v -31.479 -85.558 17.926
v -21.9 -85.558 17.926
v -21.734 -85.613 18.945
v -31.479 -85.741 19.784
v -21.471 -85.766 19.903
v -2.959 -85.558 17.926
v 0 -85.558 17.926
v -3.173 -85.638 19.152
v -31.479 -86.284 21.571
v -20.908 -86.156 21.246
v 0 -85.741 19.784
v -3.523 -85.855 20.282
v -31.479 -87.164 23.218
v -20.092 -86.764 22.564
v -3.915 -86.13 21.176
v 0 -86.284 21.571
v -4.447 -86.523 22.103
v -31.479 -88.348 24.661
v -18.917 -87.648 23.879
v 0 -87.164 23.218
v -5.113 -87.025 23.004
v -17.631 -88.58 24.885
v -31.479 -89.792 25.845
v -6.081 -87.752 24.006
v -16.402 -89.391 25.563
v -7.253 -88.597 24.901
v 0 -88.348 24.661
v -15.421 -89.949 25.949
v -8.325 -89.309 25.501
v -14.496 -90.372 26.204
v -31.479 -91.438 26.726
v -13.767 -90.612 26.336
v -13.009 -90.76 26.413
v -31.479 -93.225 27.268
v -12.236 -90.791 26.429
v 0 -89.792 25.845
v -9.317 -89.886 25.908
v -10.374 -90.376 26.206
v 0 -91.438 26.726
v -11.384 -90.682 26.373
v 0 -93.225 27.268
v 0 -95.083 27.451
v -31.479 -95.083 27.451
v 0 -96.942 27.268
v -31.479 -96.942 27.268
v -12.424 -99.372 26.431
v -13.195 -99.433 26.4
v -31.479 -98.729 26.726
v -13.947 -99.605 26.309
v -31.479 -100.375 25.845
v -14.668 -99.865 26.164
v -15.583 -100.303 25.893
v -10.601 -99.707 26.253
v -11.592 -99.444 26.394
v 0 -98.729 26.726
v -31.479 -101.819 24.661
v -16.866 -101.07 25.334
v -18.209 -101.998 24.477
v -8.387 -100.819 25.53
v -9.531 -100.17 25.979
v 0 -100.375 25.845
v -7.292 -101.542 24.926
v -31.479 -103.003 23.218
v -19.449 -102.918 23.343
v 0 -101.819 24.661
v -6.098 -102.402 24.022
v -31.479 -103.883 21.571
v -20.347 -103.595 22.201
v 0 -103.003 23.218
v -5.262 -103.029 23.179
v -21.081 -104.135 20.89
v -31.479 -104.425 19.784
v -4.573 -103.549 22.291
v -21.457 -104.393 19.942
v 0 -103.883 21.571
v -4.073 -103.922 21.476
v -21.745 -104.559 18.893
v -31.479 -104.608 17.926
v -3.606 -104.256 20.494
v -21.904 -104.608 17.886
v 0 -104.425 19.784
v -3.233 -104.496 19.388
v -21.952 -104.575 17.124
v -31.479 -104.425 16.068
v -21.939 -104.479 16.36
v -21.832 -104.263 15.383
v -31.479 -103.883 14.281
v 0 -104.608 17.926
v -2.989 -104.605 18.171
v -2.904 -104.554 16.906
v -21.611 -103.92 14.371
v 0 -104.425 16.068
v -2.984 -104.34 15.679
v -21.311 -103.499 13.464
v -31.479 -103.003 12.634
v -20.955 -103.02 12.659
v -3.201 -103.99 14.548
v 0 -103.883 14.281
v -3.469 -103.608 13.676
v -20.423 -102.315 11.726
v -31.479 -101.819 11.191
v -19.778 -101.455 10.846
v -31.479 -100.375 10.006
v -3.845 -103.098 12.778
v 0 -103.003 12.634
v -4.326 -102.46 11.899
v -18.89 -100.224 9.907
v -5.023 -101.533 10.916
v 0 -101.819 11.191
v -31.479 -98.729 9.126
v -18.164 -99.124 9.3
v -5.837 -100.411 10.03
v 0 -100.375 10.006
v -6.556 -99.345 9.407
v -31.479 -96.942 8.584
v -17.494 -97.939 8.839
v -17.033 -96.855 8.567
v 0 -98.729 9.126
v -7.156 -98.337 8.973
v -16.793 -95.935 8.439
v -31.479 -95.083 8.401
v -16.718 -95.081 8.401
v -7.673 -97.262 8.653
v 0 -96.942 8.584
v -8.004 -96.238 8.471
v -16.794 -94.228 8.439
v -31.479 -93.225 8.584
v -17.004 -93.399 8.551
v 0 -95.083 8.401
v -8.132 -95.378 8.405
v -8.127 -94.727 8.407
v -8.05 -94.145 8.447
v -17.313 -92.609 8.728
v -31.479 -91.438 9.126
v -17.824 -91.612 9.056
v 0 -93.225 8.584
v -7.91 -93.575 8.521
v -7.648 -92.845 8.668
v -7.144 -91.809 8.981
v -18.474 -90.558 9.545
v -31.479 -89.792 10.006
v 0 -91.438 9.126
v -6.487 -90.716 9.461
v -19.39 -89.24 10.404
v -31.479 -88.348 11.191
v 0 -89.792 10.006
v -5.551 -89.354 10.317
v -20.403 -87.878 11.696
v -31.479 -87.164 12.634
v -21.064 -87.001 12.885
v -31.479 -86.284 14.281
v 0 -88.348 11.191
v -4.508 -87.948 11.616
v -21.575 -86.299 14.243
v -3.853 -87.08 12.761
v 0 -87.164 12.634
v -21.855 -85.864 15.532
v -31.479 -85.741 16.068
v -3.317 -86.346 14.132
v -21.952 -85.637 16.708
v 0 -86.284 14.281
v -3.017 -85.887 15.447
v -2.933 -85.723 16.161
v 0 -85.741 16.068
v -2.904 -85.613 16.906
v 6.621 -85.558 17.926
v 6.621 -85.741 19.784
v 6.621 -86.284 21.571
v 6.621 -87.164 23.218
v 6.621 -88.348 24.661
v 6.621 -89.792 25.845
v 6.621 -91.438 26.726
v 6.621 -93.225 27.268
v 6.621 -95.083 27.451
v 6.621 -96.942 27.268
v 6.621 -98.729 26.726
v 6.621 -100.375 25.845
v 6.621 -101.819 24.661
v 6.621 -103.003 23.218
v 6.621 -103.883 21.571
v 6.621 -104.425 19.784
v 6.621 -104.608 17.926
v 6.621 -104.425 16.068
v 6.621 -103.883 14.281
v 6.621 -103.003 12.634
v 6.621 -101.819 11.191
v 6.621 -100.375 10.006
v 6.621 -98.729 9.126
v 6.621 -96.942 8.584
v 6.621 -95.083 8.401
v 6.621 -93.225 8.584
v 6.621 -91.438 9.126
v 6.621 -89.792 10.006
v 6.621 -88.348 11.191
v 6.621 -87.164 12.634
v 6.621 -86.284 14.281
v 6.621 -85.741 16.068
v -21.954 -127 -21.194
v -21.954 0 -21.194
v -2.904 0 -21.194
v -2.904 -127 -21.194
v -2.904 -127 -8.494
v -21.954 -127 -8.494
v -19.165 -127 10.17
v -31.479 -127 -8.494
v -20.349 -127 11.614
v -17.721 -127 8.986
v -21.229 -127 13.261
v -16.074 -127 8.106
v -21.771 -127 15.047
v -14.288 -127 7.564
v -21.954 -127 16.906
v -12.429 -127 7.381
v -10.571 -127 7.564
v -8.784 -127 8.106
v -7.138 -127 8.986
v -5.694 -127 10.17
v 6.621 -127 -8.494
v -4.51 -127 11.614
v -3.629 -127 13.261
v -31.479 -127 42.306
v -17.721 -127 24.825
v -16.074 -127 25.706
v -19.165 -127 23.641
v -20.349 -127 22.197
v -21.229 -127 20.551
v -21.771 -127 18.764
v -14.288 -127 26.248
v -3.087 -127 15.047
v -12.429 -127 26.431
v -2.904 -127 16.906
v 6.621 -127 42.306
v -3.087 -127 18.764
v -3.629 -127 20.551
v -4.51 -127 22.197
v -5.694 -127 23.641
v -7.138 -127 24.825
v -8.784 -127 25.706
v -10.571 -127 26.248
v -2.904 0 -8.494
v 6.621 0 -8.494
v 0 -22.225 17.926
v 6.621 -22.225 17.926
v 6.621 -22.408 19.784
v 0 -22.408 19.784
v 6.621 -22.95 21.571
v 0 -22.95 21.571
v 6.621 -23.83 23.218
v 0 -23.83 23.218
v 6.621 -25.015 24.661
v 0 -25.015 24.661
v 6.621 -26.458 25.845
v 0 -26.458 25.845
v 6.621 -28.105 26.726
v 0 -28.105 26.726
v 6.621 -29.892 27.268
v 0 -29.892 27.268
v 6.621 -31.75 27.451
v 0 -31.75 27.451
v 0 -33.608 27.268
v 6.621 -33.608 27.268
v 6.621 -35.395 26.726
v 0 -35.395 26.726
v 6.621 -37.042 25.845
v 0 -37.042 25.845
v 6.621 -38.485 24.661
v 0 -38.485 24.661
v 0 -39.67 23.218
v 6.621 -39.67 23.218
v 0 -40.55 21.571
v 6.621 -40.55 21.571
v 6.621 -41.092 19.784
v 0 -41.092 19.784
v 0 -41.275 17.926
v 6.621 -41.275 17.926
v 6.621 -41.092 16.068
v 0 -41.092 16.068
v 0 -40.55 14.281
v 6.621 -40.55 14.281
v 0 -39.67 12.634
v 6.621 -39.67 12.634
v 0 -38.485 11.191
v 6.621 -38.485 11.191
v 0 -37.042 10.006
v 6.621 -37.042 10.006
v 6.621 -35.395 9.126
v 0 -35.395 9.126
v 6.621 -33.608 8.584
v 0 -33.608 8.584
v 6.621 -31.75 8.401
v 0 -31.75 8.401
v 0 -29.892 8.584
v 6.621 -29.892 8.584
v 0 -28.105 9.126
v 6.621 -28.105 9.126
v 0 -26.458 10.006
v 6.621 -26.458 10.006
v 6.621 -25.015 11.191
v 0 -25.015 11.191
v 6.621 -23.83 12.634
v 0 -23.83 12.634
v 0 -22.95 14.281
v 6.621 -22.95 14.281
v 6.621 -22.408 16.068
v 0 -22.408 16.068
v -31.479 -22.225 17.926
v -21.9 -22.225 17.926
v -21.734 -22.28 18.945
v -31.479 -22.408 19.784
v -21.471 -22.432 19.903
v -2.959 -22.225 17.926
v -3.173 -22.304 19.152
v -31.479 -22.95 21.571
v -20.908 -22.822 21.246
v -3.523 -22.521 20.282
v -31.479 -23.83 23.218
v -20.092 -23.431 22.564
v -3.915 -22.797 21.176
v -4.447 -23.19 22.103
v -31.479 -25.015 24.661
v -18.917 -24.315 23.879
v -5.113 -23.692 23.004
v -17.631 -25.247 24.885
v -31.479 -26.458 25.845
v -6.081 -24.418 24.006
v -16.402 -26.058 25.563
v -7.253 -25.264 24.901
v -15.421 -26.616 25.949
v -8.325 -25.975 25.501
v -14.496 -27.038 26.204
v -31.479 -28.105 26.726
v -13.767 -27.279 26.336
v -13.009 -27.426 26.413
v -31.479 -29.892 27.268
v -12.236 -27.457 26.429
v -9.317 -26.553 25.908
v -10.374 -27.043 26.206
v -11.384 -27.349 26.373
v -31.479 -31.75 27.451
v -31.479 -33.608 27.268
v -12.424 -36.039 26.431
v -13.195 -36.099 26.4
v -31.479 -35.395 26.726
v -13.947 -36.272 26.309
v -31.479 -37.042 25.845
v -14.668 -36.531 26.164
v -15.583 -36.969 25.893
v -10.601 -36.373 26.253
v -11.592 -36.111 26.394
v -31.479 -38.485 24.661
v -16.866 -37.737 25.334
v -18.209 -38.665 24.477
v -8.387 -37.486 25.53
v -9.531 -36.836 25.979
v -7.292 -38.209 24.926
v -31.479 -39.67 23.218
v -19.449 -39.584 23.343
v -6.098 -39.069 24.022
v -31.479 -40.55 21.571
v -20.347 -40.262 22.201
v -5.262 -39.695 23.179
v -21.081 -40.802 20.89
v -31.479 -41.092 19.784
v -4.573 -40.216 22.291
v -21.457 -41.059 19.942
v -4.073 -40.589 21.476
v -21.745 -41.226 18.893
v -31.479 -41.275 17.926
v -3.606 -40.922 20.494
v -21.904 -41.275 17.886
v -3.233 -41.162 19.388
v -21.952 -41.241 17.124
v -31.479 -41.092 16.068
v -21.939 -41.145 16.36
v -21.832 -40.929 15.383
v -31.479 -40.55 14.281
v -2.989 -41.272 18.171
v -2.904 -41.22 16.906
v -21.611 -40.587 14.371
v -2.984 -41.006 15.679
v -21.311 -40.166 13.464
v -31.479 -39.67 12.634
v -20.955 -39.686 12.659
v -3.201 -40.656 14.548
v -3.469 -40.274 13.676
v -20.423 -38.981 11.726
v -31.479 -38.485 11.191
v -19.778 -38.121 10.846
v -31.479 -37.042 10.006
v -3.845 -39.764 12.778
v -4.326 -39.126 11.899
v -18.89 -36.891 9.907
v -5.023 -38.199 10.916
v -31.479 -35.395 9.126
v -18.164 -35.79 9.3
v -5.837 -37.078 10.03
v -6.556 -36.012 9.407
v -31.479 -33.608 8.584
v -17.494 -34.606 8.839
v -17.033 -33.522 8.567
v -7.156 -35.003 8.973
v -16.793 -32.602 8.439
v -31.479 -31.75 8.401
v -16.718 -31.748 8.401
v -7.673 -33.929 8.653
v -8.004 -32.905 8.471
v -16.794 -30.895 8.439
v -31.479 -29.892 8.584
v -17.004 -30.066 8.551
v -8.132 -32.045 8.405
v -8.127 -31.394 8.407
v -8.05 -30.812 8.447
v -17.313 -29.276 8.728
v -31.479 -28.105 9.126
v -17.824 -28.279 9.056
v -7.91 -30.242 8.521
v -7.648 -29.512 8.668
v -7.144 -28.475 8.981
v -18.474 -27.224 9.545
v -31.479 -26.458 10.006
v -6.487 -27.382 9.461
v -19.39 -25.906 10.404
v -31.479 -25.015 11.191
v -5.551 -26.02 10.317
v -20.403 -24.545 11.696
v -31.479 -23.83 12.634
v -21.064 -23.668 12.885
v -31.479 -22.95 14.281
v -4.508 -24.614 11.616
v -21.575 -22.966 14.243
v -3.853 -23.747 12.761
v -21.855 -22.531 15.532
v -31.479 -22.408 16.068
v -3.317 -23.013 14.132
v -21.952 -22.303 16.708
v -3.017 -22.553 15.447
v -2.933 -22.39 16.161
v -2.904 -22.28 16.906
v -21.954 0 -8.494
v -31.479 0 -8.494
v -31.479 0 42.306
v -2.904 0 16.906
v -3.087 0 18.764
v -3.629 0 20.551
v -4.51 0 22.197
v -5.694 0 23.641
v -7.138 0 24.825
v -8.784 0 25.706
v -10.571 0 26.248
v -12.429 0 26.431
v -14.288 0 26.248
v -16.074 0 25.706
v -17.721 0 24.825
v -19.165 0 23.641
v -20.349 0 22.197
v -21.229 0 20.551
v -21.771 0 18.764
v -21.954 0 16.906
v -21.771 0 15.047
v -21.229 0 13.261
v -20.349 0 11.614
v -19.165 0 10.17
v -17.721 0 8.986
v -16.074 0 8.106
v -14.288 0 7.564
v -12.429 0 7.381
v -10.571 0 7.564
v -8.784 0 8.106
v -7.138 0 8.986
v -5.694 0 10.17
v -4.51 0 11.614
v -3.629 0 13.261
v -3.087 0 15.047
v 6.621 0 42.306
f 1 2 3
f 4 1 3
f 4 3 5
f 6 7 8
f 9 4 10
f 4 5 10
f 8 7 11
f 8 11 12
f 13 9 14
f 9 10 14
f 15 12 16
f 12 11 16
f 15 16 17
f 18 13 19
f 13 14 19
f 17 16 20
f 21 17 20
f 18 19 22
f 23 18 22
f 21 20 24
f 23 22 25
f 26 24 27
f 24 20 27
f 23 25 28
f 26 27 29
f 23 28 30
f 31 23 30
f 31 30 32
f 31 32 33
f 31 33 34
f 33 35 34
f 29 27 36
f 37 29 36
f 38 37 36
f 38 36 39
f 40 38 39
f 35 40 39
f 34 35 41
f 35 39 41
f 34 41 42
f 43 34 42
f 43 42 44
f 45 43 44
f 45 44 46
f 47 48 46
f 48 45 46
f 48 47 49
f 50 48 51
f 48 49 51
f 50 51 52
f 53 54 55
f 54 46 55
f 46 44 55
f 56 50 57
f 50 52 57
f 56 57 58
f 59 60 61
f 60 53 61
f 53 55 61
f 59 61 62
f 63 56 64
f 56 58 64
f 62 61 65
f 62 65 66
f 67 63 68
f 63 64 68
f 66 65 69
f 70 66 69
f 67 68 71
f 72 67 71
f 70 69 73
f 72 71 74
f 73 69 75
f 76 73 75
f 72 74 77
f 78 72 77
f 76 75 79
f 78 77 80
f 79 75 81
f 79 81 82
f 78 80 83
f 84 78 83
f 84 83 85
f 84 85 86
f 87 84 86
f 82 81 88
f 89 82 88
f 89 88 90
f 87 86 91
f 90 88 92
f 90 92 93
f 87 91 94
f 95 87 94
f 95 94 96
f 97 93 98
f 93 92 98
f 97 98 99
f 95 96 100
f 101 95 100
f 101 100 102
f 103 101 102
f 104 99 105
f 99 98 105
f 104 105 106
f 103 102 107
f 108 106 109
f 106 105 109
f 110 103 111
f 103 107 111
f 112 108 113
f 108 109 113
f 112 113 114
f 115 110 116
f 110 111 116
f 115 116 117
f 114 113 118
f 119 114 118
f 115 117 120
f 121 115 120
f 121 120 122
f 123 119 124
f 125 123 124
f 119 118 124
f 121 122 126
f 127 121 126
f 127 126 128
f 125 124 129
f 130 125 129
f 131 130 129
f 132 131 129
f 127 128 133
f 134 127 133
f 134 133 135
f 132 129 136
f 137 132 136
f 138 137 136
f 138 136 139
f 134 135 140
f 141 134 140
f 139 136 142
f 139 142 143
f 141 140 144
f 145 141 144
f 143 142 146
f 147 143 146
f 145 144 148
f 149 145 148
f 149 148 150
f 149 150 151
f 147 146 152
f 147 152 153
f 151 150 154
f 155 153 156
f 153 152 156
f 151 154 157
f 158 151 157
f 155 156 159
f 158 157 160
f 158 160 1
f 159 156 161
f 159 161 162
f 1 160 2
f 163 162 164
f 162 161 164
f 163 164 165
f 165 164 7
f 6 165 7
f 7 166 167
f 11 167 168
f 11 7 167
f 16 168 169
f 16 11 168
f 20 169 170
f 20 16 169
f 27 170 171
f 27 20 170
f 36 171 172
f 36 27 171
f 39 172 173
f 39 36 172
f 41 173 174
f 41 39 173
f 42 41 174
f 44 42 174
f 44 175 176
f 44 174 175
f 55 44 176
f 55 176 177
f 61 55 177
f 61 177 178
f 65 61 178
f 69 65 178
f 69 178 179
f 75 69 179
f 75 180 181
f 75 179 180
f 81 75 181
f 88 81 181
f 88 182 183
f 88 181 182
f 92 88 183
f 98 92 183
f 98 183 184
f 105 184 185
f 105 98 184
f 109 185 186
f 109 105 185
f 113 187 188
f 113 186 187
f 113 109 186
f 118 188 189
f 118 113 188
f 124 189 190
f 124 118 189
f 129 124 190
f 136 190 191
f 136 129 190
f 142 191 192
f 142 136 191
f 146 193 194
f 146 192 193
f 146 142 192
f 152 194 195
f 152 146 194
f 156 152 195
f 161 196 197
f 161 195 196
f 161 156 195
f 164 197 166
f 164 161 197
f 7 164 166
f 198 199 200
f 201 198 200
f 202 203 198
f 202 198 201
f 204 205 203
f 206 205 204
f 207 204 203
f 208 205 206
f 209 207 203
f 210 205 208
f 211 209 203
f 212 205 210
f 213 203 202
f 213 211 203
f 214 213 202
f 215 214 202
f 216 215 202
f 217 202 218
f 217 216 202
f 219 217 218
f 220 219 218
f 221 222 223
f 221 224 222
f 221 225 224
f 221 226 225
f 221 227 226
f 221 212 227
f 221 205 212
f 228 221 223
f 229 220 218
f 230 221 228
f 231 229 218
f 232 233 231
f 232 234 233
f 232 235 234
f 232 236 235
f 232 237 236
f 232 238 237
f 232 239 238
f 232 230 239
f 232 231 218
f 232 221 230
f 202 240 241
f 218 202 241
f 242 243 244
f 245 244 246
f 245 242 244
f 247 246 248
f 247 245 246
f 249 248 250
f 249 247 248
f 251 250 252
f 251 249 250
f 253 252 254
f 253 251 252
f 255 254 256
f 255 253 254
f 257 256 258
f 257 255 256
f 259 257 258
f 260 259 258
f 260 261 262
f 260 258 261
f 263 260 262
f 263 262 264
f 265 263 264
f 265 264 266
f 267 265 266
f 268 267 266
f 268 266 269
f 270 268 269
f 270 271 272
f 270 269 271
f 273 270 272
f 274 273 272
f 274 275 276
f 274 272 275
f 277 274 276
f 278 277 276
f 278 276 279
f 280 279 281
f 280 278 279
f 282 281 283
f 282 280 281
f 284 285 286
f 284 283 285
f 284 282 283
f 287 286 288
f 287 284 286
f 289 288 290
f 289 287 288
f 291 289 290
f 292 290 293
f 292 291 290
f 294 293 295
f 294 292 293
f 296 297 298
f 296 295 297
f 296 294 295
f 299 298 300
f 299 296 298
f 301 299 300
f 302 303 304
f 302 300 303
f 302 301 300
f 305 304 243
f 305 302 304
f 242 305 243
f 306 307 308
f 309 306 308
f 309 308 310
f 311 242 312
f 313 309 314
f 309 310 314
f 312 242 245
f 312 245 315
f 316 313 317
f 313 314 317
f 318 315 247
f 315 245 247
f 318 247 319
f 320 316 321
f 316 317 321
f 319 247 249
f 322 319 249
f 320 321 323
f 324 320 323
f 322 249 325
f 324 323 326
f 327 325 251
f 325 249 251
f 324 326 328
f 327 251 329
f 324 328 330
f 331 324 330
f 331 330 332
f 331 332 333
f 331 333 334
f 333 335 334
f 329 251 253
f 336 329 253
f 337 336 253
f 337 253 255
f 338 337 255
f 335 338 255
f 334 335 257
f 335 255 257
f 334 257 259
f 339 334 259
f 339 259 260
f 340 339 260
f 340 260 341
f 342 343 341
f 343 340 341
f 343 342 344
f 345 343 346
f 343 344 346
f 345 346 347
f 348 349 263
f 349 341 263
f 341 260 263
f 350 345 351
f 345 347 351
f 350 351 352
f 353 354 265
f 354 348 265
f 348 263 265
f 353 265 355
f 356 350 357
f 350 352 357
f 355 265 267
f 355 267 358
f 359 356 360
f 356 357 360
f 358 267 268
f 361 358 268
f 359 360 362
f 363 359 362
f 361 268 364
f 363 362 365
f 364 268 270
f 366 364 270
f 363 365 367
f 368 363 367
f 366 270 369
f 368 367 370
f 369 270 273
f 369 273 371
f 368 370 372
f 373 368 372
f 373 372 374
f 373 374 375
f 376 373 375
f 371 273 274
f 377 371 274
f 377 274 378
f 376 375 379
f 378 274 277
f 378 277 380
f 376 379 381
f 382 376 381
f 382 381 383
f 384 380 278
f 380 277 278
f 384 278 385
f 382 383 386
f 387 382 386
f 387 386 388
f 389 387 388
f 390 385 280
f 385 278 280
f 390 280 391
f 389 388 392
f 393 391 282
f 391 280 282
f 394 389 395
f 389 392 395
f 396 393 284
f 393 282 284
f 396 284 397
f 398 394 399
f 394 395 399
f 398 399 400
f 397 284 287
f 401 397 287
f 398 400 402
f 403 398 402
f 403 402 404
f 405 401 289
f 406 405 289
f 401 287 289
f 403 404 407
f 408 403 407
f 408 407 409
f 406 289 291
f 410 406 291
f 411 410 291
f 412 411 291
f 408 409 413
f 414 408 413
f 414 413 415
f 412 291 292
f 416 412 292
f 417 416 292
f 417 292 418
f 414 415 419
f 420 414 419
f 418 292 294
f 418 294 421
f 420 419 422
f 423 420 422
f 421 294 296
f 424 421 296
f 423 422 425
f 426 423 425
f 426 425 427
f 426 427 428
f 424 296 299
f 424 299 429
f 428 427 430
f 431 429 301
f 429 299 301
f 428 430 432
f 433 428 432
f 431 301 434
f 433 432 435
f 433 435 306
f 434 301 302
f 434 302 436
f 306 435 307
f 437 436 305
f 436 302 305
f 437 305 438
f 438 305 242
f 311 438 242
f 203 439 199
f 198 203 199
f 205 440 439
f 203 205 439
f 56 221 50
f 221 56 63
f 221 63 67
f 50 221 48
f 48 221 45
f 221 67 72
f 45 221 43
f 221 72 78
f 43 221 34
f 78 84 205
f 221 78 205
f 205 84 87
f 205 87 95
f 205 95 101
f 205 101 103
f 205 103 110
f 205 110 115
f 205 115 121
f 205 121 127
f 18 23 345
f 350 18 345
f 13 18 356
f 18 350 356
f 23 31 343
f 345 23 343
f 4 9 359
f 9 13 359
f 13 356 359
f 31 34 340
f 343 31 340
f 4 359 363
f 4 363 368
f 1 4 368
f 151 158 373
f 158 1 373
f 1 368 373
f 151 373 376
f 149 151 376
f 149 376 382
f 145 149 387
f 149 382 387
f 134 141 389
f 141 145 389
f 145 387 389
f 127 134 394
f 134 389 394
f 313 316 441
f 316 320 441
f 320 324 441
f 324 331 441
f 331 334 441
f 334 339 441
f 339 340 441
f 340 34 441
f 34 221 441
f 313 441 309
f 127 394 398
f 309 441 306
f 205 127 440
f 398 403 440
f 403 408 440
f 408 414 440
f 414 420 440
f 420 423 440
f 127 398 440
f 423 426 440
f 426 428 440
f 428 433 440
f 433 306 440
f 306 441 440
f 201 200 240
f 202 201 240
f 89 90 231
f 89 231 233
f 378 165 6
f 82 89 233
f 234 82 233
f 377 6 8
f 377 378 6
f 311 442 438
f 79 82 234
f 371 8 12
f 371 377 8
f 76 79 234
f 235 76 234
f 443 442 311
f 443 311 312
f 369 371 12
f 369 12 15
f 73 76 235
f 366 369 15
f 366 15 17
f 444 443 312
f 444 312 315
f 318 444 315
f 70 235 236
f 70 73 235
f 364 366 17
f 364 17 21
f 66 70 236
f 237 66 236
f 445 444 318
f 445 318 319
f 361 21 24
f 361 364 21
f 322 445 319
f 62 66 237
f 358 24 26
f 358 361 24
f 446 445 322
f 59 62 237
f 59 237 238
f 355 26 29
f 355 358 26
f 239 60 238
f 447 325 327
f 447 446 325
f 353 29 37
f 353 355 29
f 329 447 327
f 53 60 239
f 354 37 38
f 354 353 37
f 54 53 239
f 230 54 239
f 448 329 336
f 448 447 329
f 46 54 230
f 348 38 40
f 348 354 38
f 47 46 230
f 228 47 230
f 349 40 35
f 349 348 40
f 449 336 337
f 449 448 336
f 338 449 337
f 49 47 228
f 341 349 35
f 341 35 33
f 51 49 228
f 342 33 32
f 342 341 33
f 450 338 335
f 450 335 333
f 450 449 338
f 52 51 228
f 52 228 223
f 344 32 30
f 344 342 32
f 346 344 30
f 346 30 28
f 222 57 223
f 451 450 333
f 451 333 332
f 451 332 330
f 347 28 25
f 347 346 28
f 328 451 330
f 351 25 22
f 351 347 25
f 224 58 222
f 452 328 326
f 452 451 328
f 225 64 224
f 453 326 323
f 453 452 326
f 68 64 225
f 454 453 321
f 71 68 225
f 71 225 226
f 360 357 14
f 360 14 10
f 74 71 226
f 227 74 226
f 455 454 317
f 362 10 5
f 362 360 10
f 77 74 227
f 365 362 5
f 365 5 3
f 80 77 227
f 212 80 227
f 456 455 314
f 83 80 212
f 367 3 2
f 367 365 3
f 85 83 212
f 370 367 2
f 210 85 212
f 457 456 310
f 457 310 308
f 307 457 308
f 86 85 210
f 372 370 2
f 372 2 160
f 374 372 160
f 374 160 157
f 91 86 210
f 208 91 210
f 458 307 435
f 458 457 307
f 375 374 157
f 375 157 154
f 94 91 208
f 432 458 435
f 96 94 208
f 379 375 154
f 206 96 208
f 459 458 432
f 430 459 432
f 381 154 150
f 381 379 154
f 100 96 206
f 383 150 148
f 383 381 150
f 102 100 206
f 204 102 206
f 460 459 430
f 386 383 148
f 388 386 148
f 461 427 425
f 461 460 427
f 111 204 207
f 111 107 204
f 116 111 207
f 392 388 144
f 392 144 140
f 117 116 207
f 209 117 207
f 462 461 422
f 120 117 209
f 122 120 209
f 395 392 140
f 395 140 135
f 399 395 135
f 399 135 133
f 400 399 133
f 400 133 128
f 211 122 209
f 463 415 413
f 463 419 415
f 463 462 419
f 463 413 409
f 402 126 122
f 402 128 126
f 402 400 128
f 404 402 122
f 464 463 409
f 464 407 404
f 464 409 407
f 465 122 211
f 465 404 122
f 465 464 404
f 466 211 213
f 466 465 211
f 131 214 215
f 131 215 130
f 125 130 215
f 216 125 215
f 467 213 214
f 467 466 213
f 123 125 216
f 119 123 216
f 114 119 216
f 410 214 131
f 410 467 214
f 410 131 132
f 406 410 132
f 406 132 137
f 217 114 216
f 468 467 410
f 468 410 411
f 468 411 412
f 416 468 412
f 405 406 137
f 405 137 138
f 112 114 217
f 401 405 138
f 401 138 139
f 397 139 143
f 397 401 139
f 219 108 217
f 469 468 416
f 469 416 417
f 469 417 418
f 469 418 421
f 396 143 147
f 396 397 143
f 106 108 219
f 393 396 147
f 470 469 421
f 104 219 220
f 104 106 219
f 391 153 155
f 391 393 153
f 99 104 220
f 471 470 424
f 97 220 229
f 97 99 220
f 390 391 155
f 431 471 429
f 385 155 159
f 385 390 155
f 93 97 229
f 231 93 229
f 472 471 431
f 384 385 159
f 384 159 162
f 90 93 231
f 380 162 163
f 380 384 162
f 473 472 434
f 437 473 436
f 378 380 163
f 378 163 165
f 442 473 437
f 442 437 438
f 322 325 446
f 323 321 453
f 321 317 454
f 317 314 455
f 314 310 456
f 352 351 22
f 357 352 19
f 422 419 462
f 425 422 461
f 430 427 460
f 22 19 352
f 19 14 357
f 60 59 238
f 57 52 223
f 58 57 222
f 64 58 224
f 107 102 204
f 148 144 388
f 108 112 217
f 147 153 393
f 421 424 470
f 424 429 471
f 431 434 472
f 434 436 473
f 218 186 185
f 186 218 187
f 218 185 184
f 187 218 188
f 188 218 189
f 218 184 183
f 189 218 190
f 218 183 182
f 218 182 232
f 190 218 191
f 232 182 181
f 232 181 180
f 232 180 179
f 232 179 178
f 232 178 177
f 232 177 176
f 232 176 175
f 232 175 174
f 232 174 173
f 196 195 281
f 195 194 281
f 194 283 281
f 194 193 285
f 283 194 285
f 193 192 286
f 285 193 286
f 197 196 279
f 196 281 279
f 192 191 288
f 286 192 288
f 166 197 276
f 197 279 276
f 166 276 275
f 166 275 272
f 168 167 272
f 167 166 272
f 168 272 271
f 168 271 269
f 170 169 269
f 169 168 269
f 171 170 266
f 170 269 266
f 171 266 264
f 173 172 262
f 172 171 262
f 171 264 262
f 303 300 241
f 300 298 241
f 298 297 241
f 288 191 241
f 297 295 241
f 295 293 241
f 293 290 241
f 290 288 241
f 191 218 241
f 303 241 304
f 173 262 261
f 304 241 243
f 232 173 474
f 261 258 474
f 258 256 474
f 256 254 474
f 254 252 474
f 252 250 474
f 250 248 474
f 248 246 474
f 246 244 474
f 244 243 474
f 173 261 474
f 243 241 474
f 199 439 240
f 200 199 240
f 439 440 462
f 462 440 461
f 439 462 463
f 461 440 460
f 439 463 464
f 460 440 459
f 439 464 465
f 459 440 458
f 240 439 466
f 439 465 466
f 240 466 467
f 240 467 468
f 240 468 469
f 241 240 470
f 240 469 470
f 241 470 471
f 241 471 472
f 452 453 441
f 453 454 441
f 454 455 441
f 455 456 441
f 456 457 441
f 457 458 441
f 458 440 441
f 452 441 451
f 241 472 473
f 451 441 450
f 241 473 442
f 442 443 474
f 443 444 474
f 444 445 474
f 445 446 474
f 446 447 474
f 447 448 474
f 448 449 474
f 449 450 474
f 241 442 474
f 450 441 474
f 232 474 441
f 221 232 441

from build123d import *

# Parameters (mm, degrees)
F0_R          = 9.525
F1_DEPTH      = 127
F2_R          = 9.525
F3_DEPTH      = 24.892
F3_DEPTH_BACK = 62.992


with BuildPart() as f1:
    # F0 (on Front) → F1 (new body)
    with BuildSketch(Plane.XZ):
        Polygon((6.620656, 42.305574), (-31.479344, 42.305574), (-31.479344, -8.494426), (-21.954344, -8.494426), (-21.954344, -21.194426), (-2.904344, -21.194426), (-2.904344, -8.494426), (6.620656, -8.494426), align=None)
        with Locations((-12.429344, 16.905574)):
            Circle(F0_R, mode=Mode.SUBTRACT)
    extrude(amount=F1_DEPTH)

    # F2 (on Right) → F3 (cut, two sides)
    with BuildSketch(Plane.YZ) as f3_sk:
        with Locations((-31.75, 17.925737)):
            Circle(F2_R)
        with Locations((-95.083454, 17.925737)):
            Circle(F2_R)
    extrude(amount=F3_DEPTH, mode=Mode.SUBTRACT)
    extrude(f3_sk.sketch, amount=-F3_DEPTH_BACK, mode=Mode.SUBTRACT)


solid = f1.part
